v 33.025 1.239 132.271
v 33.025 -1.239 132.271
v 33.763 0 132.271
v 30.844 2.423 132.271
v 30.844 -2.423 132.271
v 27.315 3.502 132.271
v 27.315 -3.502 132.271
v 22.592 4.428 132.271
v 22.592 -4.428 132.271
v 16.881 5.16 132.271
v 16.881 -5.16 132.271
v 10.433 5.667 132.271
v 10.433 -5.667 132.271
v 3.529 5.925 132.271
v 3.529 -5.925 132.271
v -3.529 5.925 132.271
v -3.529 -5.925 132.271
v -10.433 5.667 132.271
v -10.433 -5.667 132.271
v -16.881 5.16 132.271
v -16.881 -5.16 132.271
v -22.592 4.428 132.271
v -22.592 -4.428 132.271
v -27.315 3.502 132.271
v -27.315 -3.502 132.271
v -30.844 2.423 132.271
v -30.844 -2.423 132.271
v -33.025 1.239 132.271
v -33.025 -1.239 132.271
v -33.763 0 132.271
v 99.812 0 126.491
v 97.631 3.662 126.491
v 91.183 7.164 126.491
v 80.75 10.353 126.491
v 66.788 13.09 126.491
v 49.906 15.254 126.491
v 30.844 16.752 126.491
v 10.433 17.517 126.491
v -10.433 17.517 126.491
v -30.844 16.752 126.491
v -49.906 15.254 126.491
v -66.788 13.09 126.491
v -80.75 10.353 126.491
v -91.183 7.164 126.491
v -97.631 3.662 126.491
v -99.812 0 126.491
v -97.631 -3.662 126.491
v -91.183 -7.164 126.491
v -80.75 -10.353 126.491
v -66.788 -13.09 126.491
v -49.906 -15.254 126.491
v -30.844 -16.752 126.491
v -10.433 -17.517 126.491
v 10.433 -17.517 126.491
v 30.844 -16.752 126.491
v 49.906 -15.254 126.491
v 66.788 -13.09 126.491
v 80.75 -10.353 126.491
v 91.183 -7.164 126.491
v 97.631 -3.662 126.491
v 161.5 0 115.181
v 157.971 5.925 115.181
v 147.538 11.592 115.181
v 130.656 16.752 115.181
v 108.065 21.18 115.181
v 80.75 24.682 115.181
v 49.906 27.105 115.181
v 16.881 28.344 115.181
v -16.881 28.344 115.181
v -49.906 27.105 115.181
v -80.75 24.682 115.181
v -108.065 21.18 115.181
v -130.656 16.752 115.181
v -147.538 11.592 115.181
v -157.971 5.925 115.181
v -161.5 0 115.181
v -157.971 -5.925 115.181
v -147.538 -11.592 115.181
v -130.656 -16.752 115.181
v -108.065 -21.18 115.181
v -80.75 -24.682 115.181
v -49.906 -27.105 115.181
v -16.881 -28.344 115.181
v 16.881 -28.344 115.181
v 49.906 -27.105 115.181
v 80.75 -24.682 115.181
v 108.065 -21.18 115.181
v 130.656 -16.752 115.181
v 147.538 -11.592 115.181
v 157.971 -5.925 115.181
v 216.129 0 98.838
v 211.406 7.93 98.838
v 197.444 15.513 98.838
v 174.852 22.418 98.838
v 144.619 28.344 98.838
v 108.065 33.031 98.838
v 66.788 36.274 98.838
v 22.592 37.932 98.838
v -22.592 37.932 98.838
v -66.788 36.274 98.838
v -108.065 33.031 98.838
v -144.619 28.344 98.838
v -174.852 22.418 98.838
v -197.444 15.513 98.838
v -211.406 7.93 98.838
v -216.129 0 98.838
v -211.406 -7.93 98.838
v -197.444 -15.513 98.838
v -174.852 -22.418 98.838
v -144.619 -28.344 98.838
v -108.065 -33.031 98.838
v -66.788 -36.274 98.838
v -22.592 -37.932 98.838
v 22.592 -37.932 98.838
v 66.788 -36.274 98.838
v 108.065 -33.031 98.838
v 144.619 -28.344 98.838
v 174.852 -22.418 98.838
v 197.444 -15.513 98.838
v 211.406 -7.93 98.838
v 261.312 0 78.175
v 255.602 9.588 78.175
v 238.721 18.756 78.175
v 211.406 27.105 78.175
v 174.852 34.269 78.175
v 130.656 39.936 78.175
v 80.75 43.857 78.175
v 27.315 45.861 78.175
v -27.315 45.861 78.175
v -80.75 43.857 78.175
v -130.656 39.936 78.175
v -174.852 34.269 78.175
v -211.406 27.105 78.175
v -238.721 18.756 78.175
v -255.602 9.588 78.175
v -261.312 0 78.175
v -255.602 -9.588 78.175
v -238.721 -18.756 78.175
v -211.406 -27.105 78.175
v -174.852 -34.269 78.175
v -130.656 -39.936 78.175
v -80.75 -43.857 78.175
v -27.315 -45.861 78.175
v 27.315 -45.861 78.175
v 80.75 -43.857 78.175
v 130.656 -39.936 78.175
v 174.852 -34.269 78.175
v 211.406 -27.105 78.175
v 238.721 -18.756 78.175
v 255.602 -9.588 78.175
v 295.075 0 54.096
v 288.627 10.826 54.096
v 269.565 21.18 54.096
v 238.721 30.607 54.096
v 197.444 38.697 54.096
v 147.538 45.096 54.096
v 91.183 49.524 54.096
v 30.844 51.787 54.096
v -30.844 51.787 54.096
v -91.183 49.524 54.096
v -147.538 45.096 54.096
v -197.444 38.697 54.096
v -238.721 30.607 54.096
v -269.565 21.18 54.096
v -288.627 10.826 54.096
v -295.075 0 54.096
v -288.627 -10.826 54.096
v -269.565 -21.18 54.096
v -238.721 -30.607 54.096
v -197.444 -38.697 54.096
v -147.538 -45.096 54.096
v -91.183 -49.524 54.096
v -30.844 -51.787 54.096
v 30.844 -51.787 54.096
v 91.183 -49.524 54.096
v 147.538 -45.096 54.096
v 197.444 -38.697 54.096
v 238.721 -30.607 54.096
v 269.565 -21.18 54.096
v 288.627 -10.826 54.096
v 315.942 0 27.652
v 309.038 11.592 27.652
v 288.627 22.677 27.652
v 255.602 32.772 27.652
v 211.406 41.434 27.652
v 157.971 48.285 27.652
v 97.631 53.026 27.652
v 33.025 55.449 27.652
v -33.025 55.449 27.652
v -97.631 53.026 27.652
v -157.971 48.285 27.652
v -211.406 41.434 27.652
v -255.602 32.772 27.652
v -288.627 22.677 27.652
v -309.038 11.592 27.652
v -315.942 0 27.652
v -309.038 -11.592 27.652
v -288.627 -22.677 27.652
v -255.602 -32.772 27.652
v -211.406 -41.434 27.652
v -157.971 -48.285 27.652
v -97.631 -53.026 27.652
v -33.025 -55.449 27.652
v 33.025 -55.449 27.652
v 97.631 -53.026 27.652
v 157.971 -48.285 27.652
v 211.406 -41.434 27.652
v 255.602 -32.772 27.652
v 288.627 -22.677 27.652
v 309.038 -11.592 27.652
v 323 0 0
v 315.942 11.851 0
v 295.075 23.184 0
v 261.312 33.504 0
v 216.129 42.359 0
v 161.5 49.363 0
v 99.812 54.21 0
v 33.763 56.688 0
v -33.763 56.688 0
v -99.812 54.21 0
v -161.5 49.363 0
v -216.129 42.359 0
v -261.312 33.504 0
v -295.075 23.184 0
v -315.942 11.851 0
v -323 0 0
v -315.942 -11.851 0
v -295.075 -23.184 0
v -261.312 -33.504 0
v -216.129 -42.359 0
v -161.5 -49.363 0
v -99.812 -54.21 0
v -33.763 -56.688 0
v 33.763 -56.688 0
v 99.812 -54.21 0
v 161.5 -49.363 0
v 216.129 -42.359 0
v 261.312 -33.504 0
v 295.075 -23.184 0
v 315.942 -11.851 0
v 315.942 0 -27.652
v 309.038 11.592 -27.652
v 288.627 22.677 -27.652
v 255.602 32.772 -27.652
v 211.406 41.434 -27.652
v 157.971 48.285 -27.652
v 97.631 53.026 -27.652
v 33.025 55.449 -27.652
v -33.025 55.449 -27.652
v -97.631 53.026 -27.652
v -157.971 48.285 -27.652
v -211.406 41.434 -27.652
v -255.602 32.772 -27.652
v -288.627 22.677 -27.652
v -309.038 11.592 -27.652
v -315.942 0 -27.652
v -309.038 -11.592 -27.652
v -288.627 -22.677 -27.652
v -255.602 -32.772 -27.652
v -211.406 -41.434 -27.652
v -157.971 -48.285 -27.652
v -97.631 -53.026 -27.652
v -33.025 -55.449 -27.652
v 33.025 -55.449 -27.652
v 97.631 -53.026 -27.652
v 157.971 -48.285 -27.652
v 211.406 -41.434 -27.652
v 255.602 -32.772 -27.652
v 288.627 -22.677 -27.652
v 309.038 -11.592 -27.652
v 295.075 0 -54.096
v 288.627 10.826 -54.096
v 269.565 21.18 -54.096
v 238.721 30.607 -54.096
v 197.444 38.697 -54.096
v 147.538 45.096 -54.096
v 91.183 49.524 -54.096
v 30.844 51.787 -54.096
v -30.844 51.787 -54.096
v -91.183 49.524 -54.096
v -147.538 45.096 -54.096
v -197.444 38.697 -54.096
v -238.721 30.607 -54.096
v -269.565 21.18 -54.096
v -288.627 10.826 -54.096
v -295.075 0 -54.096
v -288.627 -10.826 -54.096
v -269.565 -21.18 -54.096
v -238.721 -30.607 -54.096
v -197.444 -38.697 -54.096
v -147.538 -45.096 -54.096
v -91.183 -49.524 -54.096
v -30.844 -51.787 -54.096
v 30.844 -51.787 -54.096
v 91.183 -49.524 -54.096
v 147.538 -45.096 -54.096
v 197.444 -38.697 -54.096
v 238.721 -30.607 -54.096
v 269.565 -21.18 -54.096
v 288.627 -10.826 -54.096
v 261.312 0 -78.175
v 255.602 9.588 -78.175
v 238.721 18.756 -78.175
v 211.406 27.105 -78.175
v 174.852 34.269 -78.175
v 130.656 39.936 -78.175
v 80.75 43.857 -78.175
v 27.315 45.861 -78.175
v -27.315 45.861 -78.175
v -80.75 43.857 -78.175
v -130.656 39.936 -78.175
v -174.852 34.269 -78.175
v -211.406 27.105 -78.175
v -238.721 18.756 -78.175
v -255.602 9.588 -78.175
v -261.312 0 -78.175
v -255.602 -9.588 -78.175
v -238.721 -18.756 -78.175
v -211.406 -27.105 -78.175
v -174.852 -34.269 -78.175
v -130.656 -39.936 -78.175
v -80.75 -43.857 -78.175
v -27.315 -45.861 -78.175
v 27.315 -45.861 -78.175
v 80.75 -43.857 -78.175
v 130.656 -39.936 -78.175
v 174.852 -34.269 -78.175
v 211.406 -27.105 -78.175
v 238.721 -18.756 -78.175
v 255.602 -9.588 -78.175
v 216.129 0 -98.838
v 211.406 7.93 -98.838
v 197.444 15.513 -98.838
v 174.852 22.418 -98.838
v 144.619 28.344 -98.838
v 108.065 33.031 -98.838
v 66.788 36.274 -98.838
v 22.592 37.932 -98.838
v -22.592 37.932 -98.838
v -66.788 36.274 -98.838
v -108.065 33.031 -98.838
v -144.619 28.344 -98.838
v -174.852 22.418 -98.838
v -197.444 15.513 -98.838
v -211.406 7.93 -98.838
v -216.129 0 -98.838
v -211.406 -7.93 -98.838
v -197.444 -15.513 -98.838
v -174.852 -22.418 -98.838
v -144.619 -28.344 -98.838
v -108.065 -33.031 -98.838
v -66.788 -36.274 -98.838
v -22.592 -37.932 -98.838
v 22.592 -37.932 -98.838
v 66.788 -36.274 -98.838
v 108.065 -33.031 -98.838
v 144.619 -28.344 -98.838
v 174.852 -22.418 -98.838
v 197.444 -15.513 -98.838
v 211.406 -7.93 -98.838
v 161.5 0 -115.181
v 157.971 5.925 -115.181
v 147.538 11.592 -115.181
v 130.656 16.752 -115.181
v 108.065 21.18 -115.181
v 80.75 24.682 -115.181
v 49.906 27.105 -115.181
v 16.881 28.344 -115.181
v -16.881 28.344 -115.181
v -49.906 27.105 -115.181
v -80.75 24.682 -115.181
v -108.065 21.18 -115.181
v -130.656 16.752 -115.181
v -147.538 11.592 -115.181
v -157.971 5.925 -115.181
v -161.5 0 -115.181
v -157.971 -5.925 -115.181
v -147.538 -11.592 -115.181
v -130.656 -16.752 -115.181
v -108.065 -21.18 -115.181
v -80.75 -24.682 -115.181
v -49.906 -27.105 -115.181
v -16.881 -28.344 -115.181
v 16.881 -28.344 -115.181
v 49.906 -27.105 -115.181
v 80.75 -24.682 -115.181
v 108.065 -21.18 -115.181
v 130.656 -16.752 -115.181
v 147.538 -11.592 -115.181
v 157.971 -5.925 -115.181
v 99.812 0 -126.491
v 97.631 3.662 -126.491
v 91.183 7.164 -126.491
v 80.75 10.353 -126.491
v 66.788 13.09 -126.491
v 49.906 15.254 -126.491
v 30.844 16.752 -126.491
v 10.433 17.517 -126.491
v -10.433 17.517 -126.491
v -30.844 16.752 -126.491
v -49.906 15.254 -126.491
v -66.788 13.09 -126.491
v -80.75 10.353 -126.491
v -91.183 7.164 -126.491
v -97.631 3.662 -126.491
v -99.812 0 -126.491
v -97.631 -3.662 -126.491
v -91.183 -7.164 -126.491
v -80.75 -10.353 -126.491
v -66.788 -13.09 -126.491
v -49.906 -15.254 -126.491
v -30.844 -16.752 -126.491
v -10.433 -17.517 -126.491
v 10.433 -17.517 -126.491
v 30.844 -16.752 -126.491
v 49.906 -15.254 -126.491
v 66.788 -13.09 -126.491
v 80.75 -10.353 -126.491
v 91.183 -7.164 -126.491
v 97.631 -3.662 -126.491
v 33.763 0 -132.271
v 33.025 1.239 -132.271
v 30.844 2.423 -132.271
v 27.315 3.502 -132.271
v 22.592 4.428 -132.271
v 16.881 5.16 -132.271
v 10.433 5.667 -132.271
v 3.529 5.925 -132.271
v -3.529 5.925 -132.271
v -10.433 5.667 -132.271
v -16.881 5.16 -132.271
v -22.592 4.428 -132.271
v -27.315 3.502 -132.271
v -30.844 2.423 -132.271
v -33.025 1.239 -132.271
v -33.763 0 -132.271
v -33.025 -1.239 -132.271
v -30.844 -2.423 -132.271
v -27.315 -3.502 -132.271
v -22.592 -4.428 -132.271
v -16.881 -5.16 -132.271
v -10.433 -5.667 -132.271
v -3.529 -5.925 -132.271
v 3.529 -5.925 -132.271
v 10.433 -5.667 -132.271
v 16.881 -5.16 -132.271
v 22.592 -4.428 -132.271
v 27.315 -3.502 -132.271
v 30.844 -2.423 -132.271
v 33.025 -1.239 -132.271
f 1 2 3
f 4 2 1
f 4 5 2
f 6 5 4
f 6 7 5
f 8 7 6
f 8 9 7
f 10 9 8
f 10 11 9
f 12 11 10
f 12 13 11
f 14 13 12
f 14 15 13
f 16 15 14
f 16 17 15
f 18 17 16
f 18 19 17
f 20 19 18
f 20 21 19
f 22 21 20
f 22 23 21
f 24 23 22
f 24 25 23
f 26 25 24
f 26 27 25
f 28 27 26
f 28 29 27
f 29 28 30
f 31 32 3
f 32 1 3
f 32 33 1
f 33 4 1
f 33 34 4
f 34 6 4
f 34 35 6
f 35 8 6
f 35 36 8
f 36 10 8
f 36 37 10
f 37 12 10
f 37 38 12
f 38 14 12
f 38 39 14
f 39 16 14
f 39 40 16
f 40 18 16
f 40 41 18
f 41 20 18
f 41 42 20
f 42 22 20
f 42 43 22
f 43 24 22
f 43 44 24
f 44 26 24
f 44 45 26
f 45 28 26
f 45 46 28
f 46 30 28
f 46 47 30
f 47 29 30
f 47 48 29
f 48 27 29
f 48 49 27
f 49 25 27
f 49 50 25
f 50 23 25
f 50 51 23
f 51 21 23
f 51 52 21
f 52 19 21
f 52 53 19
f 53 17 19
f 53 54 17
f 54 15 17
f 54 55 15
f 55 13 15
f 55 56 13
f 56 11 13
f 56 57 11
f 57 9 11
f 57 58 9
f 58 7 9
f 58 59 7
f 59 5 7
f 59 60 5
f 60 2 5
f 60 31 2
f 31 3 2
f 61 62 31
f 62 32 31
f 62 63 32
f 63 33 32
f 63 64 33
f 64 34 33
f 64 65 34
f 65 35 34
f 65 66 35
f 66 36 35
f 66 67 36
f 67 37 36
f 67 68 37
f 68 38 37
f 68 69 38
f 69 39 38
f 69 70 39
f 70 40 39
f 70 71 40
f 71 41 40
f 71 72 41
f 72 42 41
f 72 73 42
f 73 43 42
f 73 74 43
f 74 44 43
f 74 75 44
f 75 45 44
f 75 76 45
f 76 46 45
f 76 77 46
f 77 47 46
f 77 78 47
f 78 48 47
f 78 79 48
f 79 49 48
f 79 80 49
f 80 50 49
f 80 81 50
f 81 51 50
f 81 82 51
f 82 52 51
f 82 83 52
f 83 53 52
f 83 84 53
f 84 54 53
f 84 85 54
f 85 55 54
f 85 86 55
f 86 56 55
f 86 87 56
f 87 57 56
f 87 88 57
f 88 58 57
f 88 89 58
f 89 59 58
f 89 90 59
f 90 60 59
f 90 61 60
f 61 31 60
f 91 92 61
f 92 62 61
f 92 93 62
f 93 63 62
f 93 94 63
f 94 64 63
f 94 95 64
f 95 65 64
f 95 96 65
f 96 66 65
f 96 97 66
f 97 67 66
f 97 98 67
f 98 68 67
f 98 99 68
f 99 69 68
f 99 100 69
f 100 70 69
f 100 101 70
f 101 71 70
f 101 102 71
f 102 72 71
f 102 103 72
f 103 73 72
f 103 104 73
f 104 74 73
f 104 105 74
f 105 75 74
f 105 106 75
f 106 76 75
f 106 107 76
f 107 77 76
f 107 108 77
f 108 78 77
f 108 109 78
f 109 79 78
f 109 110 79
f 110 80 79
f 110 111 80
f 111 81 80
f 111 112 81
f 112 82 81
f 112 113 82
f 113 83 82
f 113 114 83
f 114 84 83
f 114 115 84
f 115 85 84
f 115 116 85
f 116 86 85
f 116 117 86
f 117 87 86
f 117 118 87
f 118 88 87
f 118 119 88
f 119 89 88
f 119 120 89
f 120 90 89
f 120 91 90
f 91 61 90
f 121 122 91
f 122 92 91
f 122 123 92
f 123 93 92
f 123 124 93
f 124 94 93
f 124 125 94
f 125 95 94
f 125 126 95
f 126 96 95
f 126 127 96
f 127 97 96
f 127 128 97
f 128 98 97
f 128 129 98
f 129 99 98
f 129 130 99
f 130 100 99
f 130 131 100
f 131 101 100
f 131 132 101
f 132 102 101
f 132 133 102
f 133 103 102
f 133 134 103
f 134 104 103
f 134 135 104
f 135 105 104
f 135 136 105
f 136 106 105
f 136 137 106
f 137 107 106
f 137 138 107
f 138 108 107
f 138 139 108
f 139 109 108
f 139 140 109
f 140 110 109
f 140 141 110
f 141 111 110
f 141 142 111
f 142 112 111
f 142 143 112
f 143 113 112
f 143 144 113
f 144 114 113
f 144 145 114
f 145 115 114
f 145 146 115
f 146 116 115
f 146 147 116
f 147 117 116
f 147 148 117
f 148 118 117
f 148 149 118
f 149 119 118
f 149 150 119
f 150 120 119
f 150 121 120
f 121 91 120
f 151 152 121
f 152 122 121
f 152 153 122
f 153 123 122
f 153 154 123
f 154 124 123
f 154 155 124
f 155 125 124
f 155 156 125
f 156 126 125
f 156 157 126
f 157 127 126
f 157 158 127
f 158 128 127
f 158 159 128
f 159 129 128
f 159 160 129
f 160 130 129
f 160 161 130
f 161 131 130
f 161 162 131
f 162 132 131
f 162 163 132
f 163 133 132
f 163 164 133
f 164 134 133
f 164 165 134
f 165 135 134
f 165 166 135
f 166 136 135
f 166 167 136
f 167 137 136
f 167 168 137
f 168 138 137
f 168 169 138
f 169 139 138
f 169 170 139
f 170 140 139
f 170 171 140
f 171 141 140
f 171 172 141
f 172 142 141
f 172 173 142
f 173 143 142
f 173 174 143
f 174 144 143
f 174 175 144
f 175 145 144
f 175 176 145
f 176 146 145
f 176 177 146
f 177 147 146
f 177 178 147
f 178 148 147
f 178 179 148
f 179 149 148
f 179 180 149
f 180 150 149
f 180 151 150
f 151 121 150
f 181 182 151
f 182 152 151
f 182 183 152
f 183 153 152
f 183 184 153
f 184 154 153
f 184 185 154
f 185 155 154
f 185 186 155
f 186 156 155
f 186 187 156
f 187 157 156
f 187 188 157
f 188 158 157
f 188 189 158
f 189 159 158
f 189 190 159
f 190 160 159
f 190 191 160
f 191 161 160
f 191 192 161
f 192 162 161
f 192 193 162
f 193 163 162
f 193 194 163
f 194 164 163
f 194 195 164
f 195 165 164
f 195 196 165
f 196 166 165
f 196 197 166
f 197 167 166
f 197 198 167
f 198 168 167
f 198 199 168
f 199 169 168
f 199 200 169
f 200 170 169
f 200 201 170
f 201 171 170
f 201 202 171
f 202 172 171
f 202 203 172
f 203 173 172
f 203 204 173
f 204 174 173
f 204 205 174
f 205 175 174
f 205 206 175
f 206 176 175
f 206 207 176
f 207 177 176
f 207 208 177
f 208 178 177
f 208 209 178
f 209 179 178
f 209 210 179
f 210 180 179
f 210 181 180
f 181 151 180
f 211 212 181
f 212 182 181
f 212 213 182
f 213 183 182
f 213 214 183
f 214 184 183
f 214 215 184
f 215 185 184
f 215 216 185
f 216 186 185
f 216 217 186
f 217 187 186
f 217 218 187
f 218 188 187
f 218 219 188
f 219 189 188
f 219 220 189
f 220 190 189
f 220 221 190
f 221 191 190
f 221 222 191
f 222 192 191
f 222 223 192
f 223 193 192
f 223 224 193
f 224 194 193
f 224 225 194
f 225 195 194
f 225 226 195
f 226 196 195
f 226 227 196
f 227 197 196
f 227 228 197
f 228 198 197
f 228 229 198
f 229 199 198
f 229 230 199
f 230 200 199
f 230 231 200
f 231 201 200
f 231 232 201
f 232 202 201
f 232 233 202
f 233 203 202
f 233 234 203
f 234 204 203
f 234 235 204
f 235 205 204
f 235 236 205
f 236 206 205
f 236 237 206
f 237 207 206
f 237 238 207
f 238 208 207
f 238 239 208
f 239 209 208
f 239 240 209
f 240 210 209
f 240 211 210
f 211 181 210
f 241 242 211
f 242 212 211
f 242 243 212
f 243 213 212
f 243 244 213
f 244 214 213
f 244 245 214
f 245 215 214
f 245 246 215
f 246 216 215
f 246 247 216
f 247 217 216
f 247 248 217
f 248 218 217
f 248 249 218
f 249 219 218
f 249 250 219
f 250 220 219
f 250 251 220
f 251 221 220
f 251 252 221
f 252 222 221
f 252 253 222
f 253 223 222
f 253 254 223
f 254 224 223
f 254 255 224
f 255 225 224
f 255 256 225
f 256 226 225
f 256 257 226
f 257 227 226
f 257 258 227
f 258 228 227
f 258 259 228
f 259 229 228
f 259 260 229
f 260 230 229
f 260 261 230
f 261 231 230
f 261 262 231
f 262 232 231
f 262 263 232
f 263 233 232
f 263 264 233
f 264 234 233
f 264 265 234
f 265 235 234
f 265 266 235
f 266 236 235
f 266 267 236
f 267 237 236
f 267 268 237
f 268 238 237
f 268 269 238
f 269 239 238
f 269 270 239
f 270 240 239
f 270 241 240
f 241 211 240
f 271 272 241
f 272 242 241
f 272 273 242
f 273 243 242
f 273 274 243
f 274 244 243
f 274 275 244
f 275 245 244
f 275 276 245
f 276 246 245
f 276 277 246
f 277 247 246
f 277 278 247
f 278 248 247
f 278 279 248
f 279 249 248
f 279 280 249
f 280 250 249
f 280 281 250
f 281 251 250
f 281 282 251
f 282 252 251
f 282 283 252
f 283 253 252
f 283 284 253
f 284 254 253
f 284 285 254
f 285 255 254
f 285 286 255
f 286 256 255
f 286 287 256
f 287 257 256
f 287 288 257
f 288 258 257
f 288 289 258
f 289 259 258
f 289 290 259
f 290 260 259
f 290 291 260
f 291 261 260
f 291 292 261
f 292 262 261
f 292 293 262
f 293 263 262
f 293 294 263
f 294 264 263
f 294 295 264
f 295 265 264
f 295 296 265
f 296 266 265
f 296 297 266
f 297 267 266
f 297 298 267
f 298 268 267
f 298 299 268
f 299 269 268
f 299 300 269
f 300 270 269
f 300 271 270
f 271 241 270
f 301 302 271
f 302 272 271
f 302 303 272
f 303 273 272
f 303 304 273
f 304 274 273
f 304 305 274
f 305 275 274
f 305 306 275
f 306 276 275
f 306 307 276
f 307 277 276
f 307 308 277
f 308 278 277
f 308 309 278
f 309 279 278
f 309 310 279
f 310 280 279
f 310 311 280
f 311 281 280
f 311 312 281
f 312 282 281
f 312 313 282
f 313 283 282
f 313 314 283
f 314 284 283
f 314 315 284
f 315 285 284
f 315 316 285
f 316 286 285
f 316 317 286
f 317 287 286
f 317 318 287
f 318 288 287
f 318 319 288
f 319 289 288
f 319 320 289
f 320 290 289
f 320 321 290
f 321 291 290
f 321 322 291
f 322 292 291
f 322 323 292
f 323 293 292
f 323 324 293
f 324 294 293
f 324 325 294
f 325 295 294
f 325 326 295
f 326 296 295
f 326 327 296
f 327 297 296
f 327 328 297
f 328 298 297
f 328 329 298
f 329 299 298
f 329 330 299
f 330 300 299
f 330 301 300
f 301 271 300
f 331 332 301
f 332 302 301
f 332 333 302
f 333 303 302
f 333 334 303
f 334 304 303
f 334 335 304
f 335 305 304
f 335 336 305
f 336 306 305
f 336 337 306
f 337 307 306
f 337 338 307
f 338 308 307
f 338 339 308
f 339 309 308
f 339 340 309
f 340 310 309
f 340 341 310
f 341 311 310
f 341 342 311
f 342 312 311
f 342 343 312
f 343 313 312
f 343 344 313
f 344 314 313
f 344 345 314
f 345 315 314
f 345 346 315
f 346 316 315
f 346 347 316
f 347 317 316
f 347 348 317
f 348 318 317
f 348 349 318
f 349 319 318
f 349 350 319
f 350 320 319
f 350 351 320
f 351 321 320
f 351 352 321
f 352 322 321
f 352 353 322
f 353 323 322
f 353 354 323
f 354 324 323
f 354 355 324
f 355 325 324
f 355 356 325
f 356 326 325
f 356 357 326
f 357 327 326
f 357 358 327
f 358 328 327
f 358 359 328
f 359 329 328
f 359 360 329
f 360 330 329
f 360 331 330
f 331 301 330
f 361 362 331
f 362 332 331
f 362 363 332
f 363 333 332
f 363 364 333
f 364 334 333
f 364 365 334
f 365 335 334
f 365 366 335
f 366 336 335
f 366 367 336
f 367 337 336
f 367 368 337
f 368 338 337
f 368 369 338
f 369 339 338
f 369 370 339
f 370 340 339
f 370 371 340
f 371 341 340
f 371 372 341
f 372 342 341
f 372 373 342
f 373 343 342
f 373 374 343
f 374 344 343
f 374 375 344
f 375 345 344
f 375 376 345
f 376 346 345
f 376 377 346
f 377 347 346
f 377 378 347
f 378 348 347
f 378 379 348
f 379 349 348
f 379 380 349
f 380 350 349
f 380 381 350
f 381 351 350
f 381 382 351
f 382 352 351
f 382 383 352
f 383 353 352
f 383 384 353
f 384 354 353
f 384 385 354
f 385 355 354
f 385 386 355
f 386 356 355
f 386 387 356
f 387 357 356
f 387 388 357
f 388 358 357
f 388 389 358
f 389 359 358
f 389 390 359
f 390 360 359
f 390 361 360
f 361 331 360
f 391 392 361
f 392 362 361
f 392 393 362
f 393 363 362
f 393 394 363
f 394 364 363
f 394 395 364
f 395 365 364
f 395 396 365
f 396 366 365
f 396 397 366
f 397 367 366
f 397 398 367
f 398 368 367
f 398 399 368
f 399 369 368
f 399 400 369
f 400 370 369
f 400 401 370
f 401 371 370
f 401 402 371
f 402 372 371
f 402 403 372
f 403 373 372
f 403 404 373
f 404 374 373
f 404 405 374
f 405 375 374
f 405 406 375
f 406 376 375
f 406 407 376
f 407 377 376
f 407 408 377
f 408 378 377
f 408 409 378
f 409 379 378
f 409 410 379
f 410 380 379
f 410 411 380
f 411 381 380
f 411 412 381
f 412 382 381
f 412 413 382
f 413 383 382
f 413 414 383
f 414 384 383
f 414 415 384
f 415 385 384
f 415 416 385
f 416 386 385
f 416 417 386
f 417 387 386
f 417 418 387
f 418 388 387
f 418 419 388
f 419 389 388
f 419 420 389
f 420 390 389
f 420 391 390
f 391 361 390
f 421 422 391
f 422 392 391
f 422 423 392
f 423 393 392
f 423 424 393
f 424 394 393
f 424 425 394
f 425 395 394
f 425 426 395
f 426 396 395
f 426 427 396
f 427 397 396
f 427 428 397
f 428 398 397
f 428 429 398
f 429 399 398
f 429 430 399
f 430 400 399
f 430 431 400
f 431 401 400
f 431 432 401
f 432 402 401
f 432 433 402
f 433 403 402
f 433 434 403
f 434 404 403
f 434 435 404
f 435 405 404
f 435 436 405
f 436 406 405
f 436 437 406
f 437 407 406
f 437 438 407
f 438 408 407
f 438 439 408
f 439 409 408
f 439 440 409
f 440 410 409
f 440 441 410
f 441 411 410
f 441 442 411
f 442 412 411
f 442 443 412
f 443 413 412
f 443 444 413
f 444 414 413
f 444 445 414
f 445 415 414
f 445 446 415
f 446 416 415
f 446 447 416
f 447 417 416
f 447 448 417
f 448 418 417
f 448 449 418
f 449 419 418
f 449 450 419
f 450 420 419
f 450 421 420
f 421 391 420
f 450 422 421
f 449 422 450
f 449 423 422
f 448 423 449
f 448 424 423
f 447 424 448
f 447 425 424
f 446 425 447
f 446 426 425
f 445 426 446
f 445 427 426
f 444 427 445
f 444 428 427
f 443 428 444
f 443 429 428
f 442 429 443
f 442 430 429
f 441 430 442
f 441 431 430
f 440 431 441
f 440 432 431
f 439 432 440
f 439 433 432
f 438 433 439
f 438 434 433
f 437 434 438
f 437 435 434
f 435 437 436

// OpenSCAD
// Generated by SolidPython 1.0.1 on 2020-07-29 00:46:52


scale(v = [17, 3, 7]) {
	sphere(r = 19);
}
/***********************************************
*********      SolidPython code:      **********
************************************************
 
# import packages: SolidPython
from solid import *
from solid.utils import *
from itertools import chain, combinations, permutations


class Resize:

    def __init__(self, scad_file):
        self.scad_file = scad_file
        #self.scad_file = import_scad(scad_file)
        # cone/cylinder param:
        self.r1 = 0
        self.r2 = 0
        self.h = 0
        # rectangular prism param:
        self.w = 0
        self.l = 0
        # ellipse param:
        self.r = 0

    # import OpenScad code (file name corresponds to shape)


    # classify shape + parameters
    def assign(self, param1, param2, param3):
        if self.scad_file == 'cone.scad':
            self.r1 = param1
            self.r2 = param2
            self.h = param3
        elif self.scad_file == 'cylinder.scad':
            self.r1 = param1
            self.r2 = param2
            self.h = param3
        elif self.scad_file == 'rectangularPrism.scad':
            self.h = param1
            self.l = param2
            self.w = param3
        else:
            self.r = param1
            self.h = param2

    # resize parameters
    def iterate(self):
        x = range(3, 20, 2)
        i = 1
        if self.scad_file == 'cone.scad':
            tempList = list(permutations(x, 2))
            for temp in tempList:
                param1 = temp[0]
                param2 = temp[1]
                filepath = 'produced_scad_files/' + 'cone' + str(param1) + '_' + str(param2) + '_' + '.scad'
                scad_render_to_file(cylinder(h=param1, r1=param2, r2=0), filepath)

        elif self.scad_file == 'cylinder.scad':
            tempList = list(permutations(x, 3))
            for temp in tempList:
                param1 = temp[0]
                param2 = temp[1]
                filepath = 'produced_scad_files/' + 'cylinder' + str(param1) + '_' + str(param2) + '_' + '.scad'
                scad_render_to_file(cylinder(h=param1, r1=param2, r2=param2), filepath)

        elif self.scad_file == 'rectangularPrism.scad':
            tempList = list(permutations(x, 3))
            for temp in tempList:
                param1 = temp[0]
                param2 = temp[1]
                param3 = temp[2]
                filepath = 'produced_scad_files/' + 'rectangularPrism' + str(param1) + '_' + str(param2) + '_' + str(
                    param3) + '.scad'
                scad_render_to_file(cube(size=(param1, param2, param3)), filepath)

        elif self.scad_file == 'ellipse.scad':
            tempList = list(permutations(x, 4))
            for temp in tempList:
                param1 = temp[0]
                param2 = temp[1]
                param3 = temp[2]
                param4 = temp[3]
                filepath = 'produced_scad_files/' + 'ellipse' + str(param1) + '_' + str(param2) + '_' + str(param3) + '_' + str(param4) + '.scad'
                scad_render_to_file(scale([param1, param2, param3])(sphere(r=param4)), filepath)

    def render_to_scadfile(self):
        scad_render_to_file(scad, 'example.scad') 
 
************************************************/
